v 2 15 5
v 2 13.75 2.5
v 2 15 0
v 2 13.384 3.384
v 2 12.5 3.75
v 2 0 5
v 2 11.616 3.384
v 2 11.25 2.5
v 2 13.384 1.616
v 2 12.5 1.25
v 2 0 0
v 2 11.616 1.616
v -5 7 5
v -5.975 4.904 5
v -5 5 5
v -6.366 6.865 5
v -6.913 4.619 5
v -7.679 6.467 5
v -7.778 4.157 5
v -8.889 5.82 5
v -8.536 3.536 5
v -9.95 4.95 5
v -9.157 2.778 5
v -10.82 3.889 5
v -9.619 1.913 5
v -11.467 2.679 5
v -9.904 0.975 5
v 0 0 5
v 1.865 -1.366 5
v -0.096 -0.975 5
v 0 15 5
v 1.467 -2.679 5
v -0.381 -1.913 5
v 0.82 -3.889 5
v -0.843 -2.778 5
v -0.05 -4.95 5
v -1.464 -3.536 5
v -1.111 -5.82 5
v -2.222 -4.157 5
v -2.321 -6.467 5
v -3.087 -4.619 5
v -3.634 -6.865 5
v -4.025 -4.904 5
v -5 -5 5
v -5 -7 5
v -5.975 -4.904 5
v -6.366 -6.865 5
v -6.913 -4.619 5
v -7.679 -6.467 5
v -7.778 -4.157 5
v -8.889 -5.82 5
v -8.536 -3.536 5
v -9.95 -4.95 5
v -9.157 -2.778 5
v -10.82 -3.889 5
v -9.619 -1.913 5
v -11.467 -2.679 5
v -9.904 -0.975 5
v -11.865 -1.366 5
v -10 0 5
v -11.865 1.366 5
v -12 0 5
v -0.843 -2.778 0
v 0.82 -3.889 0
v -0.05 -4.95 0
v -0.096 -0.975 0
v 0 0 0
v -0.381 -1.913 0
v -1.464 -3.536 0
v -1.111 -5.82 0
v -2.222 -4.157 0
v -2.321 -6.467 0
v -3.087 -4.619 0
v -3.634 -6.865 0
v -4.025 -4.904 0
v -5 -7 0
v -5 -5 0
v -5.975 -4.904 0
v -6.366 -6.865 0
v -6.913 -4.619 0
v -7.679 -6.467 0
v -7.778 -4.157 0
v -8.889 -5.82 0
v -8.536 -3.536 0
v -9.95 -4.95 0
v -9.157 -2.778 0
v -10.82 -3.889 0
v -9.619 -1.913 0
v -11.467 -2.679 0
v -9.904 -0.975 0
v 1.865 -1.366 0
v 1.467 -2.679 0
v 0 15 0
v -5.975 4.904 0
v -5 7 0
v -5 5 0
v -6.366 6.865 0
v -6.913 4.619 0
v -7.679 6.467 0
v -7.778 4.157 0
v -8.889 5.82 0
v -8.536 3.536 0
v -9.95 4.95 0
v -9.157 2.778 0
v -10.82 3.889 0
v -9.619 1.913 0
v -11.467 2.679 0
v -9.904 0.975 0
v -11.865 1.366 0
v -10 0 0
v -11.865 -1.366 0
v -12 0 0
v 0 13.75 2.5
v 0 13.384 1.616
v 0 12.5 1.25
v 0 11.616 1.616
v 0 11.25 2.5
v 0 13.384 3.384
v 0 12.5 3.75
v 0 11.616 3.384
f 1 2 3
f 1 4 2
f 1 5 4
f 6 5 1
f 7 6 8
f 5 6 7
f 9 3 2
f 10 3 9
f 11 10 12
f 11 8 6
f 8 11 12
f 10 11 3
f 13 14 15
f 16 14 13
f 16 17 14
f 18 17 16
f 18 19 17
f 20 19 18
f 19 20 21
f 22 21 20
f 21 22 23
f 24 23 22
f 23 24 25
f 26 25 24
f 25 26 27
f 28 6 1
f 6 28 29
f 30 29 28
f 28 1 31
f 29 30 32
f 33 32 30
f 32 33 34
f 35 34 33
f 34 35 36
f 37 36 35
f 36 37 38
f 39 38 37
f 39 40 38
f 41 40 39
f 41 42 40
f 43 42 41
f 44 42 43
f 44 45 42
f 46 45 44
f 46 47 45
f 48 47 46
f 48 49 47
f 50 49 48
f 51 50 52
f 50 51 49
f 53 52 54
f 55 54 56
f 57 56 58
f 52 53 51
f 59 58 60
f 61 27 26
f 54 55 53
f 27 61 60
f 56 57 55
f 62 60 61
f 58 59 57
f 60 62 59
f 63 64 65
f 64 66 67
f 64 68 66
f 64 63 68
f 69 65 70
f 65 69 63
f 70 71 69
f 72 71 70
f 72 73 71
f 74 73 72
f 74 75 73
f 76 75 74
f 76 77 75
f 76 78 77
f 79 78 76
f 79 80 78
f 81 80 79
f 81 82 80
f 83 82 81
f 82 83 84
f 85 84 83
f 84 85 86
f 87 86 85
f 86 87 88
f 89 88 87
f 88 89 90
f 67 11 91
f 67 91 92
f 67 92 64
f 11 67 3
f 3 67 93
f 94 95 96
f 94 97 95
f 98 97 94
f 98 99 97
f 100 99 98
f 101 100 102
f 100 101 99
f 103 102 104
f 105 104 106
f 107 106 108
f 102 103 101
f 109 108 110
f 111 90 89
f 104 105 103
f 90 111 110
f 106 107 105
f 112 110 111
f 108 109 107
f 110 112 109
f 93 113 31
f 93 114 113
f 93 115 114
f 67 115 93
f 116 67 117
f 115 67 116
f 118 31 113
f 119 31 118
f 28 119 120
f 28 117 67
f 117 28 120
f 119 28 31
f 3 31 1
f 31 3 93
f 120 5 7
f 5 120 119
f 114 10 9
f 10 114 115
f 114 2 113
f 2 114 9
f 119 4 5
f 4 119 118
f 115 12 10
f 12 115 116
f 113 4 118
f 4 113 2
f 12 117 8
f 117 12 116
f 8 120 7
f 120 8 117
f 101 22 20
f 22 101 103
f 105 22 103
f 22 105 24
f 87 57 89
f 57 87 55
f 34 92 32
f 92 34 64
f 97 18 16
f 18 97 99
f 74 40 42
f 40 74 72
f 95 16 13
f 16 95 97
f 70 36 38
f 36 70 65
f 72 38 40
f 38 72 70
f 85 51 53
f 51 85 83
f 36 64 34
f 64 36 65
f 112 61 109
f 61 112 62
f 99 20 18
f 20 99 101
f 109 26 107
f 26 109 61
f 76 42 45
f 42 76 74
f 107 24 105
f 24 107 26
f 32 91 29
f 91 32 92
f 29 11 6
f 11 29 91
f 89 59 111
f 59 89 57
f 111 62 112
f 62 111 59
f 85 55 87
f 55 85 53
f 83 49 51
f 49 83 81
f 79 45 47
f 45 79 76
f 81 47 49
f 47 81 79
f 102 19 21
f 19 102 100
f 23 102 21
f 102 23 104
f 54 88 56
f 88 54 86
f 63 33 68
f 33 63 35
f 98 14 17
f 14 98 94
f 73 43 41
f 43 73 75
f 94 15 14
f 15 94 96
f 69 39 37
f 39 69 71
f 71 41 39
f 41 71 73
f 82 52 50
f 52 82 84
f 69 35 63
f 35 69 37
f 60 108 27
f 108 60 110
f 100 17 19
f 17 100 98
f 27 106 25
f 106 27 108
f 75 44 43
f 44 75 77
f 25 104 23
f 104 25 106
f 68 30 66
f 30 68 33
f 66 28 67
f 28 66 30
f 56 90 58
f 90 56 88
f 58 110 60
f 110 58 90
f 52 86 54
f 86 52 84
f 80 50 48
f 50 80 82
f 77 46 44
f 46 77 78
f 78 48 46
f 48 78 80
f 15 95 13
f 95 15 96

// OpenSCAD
// cable hook for running ethernet

cableD = 10;
thick=5;
nailD = 2.5;
thin=2;
tall=15;

difference() {
	cube([thin,tall,thick]);
	translate([thin/2,tall-thick/2,thick/2])
		rotate([0,90,0]) 
		cylinder(d=nailD, h=thin+2, $fn=8, center=true);
	}
translate([-cableD/2,0,0]) difference() {
	cylinder(d=cableD+thin*2, h=thick, $fn=32);
	translate([0,0,-1]) cylinder(d=cableD, h=thick+2, $fn=32);
	translate([0,0,-1]) cube([cableD/2,tall,thick+2]);
	}
